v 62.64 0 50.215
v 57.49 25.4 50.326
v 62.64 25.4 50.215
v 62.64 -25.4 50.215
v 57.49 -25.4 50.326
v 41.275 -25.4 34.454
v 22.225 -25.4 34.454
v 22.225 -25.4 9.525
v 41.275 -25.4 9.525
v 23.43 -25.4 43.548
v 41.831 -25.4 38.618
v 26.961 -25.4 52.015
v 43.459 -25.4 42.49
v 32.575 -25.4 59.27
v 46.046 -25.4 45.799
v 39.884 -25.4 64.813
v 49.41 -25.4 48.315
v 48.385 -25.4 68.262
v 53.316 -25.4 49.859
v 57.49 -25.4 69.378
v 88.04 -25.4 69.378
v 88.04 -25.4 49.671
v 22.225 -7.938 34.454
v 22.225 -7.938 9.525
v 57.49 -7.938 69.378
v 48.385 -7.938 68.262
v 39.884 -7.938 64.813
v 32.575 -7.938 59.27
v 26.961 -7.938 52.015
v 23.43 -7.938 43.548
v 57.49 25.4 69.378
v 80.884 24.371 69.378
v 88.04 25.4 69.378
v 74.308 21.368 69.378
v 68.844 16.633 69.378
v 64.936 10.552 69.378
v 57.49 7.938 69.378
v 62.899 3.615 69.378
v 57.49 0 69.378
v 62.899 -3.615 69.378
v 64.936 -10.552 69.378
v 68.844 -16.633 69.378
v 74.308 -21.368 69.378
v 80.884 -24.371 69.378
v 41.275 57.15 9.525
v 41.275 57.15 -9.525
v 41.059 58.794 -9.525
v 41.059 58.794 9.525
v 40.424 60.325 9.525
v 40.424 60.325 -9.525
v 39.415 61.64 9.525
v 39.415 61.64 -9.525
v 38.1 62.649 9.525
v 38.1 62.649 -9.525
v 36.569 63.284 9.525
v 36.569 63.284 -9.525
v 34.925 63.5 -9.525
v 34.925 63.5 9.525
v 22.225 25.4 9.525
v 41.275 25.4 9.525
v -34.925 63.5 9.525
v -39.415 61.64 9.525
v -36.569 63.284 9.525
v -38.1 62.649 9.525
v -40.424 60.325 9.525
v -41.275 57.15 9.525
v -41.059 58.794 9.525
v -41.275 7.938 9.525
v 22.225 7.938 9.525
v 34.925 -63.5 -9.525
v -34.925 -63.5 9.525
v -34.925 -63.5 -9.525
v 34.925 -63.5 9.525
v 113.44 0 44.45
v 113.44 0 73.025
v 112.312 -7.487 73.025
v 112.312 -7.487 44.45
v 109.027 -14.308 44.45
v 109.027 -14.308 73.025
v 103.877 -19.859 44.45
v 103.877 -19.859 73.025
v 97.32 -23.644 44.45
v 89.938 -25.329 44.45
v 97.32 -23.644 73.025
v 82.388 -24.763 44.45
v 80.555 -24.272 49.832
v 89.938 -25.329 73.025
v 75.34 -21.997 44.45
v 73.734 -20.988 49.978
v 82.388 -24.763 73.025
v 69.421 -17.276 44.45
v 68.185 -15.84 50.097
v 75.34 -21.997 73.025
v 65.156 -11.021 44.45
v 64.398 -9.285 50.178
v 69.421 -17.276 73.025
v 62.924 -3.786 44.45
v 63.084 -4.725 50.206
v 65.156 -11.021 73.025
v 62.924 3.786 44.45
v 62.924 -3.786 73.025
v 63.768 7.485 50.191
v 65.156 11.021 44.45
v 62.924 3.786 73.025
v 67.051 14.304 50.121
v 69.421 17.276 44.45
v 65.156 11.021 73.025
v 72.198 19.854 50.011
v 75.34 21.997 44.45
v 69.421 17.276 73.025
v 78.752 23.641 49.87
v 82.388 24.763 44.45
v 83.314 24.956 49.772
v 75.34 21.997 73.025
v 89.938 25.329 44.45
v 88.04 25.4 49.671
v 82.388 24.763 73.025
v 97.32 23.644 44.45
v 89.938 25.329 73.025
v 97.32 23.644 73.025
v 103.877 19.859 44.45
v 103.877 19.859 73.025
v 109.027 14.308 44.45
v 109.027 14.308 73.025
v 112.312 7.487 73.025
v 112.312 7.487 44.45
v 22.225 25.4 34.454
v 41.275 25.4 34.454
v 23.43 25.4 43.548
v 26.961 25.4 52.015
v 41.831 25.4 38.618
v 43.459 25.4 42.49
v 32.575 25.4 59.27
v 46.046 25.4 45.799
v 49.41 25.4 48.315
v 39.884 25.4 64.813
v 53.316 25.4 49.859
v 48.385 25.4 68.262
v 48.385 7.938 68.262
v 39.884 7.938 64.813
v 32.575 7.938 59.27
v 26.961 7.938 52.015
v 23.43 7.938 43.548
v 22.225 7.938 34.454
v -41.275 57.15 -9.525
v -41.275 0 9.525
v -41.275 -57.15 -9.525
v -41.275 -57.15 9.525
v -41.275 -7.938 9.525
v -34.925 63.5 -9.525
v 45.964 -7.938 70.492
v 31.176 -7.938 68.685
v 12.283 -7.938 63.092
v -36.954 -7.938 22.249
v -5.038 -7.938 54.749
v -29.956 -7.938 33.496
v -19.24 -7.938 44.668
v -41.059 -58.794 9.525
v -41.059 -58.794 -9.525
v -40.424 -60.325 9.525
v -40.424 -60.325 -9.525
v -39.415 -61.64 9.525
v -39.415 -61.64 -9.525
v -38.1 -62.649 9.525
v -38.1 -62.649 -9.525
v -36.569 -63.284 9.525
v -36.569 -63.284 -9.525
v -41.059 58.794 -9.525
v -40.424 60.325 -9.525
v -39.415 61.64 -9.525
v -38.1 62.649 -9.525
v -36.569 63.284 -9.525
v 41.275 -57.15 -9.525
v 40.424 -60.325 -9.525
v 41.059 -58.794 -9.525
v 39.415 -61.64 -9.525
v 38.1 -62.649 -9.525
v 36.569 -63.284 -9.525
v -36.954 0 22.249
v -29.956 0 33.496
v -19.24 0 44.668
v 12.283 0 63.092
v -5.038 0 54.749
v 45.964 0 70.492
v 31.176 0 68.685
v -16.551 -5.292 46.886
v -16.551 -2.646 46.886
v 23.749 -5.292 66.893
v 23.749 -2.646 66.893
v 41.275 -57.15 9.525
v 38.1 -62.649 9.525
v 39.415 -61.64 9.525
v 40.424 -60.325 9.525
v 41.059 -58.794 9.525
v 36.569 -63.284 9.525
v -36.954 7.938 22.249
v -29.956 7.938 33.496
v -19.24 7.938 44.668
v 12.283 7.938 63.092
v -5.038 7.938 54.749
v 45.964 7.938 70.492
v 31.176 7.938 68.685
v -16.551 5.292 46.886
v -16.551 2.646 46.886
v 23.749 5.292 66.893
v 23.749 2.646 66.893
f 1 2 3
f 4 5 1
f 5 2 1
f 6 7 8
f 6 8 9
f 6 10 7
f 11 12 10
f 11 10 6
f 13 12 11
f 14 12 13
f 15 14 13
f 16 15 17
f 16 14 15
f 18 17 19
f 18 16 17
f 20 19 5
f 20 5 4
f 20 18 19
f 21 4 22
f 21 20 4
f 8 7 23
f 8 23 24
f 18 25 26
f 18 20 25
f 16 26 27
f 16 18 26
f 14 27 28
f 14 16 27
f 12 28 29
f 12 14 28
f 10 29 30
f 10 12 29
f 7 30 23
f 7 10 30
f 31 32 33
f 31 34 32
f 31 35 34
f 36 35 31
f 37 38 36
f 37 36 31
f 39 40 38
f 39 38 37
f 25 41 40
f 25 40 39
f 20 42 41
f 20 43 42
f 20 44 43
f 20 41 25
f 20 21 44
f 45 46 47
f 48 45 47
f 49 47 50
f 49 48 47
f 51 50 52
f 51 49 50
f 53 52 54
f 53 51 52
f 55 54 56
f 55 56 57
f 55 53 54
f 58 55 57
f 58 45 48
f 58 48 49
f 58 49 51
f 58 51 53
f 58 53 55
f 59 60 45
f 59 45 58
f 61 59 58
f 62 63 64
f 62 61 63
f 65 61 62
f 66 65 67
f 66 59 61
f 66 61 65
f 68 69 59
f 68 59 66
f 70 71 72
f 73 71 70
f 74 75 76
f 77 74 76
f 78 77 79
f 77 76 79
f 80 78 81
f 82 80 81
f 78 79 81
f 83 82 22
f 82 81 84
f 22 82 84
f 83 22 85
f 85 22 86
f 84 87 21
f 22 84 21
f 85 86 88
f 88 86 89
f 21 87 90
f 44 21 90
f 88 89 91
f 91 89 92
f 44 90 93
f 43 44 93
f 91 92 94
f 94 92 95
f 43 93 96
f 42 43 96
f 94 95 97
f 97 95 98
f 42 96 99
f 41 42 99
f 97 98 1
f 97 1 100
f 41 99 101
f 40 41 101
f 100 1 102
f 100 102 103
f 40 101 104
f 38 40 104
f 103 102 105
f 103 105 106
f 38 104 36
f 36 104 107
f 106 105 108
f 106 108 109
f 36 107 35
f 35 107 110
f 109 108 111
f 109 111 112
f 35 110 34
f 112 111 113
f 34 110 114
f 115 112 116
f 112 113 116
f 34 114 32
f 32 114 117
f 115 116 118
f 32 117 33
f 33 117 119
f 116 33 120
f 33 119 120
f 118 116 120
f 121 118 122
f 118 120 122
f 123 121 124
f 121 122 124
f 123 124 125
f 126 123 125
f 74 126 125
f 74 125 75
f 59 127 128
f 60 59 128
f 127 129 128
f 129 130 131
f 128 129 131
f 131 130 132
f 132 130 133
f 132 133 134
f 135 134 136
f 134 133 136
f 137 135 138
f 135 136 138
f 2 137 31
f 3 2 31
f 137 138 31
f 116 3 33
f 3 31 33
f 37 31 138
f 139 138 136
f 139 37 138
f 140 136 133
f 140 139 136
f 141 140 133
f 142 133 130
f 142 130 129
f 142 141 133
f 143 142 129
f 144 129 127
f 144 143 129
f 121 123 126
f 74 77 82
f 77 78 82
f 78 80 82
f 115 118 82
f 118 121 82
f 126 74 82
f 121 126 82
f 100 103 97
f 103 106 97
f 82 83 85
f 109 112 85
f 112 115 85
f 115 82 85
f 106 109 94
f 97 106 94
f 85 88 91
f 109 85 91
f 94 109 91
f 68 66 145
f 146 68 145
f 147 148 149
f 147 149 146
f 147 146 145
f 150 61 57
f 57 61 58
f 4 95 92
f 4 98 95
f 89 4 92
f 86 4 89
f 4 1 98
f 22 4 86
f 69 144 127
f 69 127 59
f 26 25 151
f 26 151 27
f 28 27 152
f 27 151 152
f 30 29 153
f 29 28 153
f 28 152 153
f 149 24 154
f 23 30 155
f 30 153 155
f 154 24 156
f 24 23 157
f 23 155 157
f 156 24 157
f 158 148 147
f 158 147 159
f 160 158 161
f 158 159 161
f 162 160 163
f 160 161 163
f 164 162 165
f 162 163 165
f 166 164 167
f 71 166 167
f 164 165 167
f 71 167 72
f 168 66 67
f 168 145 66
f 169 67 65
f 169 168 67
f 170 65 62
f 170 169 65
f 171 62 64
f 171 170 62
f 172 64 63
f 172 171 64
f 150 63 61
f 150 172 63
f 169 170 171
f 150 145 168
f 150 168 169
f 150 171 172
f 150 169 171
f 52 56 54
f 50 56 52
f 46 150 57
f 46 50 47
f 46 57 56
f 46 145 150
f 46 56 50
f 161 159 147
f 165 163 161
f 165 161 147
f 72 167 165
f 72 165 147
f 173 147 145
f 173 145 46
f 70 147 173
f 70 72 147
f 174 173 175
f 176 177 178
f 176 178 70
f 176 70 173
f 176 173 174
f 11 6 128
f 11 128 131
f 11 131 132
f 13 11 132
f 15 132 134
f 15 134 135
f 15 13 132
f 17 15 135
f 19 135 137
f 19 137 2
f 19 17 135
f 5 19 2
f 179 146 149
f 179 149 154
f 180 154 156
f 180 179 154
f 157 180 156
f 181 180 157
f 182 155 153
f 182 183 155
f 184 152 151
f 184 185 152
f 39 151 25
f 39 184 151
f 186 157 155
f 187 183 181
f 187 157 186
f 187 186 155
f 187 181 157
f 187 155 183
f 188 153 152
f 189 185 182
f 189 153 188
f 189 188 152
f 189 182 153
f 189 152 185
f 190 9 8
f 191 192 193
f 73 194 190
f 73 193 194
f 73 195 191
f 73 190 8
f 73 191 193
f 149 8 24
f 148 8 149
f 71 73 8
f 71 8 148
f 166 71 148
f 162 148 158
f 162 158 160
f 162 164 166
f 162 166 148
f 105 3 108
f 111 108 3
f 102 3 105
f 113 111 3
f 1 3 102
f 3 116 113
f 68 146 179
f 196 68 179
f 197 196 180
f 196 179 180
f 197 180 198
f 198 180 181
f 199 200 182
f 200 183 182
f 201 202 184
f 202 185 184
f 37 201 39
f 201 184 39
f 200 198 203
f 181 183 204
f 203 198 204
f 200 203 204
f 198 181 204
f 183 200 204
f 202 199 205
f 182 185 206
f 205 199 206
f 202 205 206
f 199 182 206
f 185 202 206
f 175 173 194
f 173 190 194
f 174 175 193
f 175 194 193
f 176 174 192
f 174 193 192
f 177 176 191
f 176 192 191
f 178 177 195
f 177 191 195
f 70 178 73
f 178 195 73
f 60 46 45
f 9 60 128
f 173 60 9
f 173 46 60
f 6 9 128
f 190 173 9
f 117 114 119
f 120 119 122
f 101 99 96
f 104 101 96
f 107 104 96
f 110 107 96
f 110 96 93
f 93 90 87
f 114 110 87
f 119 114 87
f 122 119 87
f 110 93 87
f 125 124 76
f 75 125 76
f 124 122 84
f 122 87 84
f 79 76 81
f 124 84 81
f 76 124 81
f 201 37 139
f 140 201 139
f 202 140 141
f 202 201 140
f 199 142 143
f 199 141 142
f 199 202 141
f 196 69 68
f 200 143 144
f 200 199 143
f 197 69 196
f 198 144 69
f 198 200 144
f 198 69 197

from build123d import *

# Parameters (mm, degrees)
F1_DEPTH = 63.5
F2_DEPTH = 25.4
F3_DEPTH = 7.9375
F5_R     = 6.35


with BuildPart() as f1:
    # F0 (on Front) → F1 (new body, symmetric)
    with BuildSketch(Plane.XZ):
        Polygon((22.225, 9.525), (-41.275, 9.525), (-41.275, -9.525), (41.275, -9.525), (41.275, 9.525), align=None)
    extrude(amount=F1_DEPTH, both=True)

    # F0 (on Front) → F2 (join, symmetric)
    with BuildSketch(Plane.XZ):
        with BuildLine():
            Line((22.225, 34.4544437543), (22.225, 9.525))
            Line((22.225, 9.525), (41.275, 9.525))
            Line((41.275, 9.525), (41.275, 34.4544437543))
            ThreePointArc((41.275, 34.4544437543), (46.045587398, 45.7993829681), (57.4901364744, 50.3257994676))
            Line((57.4901364744, 50.3257994676), (57.4901364744, 69.3777874112))
            ThreePointArc((57.4901364744, 69.3777874112), (32.5748463013, 59.2701131123), (22.225, 34.4544437543))
        make_face()
        Polygon((88.0403167844, 69.3777874112), (62.6403167844, 69.3777874112), (62.6403167844, 50.2154267808), (88.0403167844, 49.6710834616), align=None)
        Polygon((62.6403167844, 69.3777874112), (57.4901364744, 69.3777874112), (57.4901364744, 50.3257994676), (62.6403167844, 50.2154267808), align=None)
    extrude(amount=F2_DEPTH, both=True)

    # F0 (on Front) → F3 (join, symmetric)
    with BuildSketch(Plane.XZ):
        with BuildLine():
            add(Edge.make_bspline(
                [(-41.275, 9.525), (-31.7188613117, 55.5080212653), (34.4085570037, 75.710179948), (57.4901364744, 69.3777874112)],
                knots=[0, 0, 0, 0, 115.4855330494, 115.4855330494, 115.4855330494, 115.4855330494], degree=3))
            Line((-41.275, 9.525), (22.225, 9.525))
            Line((22.225, 9.525), (22.225, 34.4544437543))
            ThreePointArc((22.225, 34.4544437543), (32.5748463013, 59.2701131123), (57.4901364744, 69.3777874112))
        make_face()
    extrude(amount=F3_DEPTH, both=True)

    # F0 (on Front) → F4 (revolve)
    with BuildSketch(Plane.XZ):
        Polygon((88.0403167844, 73.025), (88.0403167844, 69.3777874112), (88.0403167844, 49.6710834616), (88.0403167844, 44.45), (113.4403167844, 44.45), (113.4403167844, 73.025), align=None)
    revolve(axis=Axis((88.0403167844, 0, 58.7375), (0, 0, -1)))

    # F5
    f5_edges = [f1.edges().sort_by_distance(p)[0] for p in [
        (41.275, -63.5, 0),
        (-41.275, -63.5, 0),
        (-41.275, 63.5, 0),
        (41.275, 63.5, 0),
    ]]
    fillet(f5_edges, radius=F5_R)


solid = f1.part
